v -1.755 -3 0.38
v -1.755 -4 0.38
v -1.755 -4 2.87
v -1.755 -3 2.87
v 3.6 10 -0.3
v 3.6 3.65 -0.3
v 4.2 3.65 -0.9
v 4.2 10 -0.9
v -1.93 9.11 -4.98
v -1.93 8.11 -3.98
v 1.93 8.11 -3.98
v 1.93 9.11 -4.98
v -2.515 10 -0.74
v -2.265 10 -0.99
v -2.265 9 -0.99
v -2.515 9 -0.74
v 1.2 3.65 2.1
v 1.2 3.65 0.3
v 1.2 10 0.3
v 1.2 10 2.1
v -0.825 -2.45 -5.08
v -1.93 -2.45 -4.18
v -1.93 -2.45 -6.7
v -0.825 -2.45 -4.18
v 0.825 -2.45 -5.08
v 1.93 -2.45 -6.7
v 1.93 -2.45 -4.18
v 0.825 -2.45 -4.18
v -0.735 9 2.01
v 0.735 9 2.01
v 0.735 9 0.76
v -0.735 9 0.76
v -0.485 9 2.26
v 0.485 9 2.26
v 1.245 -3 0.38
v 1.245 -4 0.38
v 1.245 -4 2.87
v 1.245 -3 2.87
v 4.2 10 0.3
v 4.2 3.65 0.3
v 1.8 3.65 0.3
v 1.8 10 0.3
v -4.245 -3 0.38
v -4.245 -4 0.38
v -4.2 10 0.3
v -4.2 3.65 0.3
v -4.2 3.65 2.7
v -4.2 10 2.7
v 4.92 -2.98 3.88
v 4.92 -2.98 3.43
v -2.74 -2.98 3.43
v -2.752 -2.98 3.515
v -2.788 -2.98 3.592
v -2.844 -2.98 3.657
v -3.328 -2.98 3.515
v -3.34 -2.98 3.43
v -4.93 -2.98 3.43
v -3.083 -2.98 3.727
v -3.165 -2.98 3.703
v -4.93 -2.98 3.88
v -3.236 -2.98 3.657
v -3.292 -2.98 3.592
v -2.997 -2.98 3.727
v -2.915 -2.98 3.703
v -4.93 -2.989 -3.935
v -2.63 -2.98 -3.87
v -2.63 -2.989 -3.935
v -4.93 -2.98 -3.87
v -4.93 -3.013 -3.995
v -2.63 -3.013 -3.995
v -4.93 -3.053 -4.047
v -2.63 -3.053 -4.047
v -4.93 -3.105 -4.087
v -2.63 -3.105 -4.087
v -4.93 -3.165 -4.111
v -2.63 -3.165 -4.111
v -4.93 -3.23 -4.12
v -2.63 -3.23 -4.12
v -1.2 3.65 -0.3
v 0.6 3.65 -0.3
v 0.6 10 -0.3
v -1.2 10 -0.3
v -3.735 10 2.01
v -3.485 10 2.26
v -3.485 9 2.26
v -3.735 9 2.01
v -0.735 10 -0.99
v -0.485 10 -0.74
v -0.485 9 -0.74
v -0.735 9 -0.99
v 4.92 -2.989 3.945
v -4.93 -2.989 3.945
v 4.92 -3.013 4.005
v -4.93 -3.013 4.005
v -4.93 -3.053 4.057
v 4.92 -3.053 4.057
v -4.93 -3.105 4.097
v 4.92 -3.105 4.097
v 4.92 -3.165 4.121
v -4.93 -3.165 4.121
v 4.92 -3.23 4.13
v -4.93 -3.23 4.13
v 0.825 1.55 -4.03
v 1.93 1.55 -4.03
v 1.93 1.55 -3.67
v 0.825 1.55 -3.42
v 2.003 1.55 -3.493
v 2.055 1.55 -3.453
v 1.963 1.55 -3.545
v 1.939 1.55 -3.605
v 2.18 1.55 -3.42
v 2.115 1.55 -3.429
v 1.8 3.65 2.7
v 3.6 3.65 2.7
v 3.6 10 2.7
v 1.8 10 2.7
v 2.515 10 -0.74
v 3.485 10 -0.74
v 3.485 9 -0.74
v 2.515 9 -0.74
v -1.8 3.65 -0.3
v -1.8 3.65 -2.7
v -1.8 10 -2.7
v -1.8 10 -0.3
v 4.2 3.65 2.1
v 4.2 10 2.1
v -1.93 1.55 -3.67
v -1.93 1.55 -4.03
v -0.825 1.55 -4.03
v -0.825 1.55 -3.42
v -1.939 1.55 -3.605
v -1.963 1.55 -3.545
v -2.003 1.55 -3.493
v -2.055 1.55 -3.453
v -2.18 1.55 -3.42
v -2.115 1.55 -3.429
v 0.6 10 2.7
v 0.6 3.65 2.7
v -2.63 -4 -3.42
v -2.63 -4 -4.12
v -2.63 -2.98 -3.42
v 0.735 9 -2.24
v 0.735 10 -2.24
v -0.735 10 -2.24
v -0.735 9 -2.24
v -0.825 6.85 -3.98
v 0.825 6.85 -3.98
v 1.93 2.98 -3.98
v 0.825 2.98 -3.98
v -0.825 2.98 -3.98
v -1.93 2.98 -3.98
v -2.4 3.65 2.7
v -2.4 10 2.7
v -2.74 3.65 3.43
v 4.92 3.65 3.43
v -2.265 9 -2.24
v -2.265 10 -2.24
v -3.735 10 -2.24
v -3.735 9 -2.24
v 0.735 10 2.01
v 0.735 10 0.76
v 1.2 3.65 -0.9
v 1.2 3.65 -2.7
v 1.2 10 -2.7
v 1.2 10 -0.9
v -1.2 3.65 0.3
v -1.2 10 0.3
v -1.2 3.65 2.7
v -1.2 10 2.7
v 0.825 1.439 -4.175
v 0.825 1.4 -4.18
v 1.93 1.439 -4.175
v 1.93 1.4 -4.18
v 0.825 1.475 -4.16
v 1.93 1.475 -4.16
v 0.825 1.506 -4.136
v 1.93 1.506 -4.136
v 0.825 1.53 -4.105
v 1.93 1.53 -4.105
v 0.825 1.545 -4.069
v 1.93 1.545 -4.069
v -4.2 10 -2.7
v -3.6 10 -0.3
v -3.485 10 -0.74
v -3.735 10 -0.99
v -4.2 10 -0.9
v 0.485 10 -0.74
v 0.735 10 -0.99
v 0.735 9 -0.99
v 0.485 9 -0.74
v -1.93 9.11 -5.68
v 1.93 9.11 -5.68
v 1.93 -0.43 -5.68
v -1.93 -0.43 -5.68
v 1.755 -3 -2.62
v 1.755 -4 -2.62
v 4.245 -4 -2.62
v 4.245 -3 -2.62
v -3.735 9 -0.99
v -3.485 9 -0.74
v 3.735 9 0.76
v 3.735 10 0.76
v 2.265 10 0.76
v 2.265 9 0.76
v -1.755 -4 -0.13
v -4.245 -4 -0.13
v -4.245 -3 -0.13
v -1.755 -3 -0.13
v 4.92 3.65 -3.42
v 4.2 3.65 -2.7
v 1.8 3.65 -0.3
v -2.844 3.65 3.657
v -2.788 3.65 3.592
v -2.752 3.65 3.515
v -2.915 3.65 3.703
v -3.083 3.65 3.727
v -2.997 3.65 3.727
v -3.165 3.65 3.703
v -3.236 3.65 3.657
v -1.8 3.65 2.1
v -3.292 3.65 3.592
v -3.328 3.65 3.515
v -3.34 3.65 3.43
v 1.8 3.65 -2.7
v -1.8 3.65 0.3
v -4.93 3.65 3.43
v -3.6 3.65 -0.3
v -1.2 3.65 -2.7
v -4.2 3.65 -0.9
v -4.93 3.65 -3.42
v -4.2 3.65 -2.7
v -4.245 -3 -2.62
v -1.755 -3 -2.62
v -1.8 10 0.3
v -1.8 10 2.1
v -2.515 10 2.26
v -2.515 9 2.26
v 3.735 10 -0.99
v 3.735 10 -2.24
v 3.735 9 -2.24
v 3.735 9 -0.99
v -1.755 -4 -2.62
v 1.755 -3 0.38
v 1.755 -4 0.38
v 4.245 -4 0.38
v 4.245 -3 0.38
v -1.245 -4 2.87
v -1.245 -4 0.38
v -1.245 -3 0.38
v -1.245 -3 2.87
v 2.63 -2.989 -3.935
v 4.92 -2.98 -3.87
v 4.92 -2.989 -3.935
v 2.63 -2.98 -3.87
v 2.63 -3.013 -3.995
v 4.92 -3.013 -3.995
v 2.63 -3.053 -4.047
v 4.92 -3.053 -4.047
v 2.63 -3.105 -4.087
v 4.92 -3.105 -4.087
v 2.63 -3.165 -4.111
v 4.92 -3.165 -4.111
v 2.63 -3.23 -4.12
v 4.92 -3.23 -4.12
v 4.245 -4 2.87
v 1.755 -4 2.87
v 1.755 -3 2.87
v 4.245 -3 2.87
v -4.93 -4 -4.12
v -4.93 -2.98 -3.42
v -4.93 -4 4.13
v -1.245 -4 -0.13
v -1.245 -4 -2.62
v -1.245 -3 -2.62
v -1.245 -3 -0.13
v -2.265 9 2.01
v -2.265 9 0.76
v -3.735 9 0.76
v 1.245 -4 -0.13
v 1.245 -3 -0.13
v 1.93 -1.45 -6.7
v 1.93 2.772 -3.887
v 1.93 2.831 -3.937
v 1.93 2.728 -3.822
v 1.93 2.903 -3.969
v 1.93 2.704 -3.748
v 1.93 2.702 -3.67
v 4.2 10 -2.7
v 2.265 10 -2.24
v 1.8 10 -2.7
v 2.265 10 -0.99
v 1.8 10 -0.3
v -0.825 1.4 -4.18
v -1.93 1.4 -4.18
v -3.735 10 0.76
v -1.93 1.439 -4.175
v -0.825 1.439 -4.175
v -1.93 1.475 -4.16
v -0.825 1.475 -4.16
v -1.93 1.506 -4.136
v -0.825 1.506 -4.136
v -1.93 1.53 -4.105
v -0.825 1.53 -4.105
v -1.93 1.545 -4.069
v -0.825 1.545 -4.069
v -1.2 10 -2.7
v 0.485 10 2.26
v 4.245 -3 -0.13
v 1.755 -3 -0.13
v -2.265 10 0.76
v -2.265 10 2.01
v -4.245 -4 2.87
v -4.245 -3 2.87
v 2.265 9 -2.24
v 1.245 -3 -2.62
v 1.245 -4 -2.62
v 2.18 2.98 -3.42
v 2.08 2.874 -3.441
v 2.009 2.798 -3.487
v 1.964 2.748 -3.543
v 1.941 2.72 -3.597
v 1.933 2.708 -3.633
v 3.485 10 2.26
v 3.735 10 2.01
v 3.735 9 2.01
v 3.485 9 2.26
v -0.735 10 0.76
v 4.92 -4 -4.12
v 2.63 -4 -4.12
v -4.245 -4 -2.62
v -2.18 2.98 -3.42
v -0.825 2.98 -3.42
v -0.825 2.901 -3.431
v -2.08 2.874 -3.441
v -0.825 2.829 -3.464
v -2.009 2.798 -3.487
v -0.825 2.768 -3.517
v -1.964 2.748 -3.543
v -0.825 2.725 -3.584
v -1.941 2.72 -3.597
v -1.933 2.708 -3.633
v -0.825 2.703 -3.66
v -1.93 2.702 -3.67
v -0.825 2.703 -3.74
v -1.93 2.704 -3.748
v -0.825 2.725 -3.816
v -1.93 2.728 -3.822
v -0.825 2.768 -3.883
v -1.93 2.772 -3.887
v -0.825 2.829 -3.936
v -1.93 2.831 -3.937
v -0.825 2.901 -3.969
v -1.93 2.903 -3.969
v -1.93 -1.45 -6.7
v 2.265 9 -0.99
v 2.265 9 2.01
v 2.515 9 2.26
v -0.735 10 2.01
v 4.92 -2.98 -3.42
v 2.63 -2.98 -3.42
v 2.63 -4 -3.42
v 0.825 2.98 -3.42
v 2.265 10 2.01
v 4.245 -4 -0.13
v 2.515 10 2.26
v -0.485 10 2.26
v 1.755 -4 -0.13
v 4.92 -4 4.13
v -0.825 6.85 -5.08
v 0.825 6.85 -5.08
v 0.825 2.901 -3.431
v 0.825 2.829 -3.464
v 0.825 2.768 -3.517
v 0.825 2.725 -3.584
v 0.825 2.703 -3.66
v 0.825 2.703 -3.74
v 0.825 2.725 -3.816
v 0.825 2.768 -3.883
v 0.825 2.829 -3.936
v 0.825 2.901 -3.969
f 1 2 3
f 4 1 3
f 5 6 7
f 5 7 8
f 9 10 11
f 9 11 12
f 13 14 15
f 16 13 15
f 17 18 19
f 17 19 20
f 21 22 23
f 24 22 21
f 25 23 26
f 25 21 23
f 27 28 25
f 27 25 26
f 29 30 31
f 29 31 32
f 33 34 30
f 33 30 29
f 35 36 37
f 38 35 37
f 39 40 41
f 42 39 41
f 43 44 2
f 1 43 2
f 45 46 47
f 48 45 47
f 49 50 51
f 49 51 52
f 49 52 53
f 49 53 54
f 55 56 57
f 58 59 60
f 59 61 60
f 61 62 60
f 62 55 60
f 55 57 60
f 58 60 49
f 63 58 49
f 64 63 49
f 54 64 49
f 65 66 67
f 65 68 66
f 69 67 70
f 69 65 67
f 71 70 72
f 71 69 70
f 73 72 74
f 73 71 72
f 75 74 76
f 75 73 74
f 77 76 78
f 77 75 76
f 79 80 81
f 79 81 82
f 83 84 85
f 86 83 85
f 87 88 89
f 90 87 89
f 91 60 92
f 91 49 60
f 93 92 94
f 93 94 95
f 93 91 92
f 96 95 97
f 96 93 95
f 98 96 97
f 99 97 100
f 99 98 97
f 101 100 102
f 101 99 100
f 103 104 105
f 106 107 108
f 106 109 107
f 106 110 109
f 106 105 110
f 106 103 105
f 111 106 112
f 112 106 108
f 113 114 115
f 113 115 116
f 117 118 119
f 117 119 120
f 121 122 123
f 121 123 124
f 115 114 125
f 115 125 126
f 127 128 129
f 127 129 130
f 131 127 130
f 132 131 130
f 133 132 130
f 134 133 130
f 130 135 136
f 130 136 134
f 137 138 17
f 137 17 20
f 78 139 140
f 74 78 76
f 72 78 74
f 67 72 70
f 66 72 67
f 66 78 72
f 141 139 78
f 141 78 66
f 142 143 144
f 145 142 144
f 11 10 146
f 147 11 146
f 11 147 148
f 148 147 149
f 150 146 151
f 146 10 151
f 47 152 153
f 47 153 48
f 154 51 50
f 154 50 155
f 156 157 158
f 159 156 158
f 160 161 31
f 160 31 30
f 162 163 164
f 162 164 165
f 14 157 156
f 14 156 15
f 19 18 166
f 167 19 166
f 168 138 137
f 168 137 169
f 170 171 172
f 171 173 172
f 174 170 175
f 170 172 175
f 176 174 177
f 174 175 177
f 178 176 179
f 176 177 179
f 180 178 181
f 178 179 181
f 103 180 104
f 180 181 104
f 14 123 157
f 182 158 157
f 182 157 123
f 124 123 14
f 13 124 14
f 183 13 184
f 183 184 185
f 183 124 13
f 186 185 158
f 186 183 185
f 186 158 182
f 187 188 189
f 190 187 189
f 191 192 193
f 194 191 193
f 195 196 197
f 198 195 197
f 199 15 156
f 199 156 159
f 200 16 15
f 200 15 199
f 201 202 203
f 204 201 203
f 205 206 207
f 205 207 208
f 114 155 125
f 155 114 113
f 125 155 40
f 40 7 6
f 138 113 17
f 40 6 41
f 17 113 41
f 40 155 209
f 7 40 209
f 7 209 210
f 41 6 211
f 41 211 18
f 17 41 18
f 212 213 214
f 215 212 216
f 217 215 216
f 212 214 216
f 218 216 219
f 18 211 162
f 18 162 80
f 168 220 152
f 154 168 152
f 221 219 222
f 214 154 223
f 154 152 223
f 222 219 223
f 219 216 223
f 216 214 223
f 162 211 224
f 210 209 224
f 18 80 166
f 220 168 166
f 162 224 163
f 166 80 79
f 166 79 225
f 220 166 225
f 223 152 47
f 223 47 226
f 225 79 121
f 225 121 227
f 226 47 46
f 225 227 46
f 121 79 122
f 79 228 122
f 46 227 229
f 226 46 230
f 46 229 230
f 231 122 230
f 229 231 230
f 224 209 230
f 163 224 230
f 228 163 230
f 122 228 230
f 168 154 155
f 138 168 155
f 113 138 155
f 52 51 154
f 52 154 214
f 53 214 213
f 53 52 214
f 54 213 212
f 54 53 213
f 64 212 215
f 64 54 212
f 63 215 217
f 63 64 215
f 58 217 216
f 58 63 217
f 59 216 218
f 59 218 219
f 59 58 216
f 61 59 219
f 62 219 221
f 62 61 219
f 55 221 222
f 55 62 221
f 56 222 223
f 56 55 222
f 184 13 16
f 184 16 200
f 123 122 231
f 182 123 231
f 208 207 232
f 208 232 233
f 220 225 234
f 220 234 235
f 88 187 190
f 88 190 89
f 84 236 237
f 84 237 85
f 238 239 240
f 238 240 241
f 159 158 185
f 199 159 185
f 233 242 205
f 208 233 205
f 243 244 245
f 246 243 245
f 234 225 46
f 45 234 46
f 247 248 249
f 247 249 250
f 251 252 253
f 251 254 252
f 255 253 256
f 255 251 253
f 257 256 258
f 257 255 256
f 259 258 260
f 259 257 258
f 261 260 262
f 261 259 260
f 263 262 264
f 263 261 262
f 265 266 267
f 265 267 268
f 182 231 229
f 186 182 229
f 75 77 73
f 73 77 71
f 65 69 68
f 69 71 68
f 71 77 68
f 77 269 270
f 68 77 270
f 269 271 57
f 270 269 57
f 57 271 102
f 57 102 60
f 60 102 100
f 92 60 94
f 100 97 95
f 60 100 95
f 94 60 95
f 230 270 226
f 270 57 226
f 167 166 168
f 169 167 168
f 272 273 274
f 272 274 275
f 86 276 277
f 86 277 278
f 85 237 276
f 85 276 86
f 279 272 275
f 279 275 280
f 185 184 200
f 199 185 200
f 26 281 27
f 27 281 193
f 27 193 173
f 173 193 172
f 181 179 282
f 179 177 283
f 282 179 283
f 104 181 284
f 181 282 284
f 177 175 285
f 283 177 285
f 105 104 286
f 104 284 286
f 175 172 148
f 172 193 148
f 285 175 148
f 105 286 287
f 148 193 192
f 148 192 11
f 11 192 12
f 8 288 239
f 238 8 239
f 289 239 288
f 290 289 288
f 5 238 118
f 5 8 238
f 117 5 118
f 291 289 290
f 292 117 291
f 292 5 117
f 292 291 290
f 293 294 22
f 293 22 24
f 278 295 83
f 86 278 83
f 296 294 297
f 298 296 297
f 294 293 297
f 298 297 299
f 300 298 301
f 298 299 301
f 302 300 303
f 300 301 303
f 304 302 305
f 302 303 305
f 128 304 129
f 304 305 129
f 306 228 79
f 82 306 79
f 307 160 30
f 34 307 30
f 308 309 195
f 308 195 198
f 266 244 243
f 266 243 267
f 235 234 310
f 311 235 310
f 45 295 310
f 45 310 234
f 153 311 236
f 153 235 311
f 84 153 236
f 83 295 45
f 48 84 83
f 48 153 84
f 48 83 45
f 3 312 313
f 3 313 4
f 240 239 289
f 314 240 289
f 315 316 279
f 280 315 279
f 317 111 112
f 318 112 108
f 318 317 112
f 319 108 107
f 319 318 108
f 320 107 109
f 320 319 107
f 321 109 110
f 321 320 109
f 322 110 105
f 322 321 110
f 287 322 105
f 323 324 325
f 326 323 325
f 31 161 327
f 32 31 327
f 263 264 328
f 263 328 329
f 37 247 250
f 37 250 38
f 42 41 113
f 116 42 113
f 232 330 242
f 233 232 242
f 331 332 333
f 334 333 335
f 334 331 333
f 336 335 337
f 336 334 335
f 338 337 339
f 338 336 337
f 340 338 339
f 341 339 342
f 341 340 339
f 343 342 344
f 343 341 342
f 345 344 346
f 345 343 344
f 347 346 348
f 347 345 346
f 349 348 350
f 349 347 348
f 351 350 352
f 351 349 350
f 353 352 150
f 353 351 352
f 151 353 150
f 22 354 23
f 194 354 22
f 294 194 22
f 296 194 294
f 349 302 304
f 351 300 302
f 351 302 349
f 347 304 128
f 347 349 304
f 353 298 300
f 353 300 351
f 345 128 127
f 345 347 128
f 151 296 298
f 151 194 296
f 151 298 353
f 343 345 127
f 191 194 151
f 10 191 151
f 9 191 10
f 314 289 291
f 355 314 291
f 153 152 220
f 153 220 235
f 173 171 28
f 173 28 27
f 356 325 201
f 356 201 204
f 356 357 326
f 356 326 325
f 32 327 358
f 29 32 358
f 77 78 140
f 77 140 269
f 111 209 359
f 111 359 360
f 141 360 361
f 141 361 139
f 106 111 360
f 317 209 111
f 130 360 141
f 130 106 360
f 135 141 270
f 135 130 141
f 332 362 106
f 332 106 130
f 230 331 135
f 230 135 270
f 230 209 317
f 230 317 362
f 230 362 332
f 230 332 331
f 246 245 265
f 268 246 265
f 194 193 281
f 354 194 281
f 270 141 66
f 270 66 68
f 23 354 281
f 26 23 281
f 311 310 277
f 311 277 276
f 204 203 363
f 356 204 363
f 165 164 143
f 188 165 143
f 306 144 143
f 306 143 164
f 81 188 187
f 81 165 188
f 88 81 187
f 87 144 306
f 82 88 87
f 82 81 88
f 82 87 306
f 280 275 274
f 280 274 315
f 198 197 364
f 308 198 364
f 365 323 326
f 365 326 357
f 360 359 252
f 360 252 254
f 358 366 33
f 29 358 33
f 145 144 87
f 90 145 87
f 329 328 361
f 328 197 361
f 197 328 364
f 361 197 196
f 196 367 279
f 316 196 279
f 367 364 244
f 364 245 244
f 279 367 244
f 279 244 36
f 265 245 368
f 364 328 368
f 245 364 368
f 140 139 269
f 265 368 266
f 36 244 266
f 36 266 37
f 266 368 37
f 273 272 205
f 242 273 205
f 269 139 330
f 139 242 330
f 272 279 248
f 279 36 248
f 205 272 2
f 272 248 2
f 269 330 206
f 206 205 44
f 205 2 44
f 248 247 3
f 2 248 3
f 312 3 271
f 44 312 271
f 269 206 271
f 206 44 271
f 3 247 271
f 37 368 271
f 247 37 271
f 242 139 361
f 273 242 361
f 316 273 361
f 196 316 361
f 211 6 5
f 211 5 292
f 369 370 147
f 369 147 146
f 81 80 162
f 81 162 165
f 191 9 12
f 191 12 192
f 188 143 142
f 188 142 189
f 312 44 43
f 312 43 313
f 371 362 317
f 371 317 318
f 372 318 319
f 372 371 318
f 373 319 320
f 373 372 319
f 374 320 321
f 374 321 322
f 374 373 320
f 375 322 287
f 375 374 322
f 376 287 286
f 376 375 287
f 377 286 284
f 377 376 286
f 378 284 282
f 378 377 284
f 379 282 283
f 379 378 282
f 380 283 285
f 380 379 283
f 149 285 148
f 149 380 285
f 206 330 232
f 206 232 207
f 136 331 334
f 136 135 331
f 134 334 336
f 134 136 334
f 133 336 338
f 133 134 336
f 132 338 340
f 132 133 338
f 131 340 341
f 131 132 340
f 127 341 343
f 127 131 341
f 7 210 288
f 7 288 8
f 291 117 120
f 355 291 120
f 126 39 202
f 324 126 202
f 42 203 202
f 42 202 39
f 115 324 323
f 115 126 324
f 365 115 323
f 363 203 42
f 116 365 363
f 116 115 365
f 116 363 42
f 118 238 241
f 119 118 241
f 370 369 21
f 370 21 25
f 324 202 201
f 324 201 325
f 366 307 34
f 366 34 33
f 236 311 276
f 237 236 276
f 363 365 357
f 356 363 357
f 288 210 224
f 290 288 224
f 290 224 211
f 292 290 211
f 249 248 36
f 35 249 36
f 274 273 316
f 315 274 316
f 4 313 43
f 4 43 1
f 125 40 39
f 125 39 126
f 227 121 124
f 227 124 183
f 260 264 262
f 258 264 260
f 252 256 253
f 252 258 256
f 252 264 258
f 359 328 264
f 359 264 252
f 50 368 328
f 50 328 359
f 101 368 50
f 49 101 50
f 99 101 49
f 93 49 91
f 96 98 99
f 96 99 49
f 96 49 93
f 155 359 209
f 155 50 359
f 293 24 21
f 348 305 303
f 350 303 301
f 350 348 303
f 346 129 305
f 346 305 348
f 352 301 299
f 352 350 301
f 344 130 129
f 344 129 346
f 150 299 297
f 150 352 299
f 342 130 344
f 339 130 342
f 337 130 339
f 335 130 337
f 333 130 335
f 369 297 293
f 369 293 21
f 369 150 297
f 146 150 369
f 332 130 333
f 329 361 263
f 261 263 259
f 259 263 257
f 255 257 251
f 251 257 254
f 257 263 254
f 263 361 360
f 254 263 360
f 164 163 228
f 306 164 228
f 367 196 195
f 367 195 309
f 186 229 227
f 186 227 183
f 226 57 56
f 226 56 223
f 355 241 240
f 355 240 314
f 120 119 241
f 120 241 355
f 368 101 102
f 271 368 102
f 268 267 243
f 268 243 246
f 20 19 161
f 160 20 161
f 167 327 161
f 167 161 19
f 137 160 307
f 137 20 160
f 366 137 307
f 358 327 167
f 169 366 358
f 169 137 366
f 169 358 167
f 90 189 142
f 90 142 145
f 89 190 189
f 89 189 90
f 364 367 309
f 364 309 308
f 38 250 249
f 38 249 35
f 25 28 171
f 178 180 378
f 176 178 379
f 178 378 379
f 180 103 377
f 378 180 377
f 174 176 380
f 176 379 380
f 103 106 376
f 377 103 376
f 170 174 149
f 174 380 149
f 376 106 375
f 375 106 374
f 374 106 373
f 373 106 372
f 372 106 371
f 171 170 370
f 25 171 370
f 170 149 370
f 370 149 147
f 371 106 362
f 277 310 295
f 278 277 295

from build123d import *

# Parameters (mm, degrees)
BOSS_EXTRUDE1_START  = -0.825
BOSS_EXTRUDE1_DEPTH  = 1.65
BOSS_EXTRUDE2_START  = 1.105
BOSS_EXTRUDE2_DEPTH  = 1.105
BOSS_EXTRUDE3_DEPTH  = 1.105
CUT_EXTRUDE1_DEPTH   = 1.65
SKETCH5_W            = 9.85
SKETCH5_H            = 7.65
BOSS_EXTRUDE4_DEPTH  = 7.55
CUT_EXTRUDE2_REACH   = 15.28
SKETCH6_W            = 1.65
SKETCH6_H            = 5.3
SKETCH7_W            = 3.86
SKETCH7_H            = 2.52
BOSS_EXTRUDE5_DEPTH  = 4
SKETCH8_W            = 1.65
SKETCH8_H            = 9.3
CUT_EXTRUDE3_DEPTH   = 0.9
SKETCH9_W            = 0.7
SKETCH9_H            = 6.63
CUT_EXTRUDE4_DEPTH   = 15.996819663
BOSS_EXTRUDE6_DEPTH  = 6.63
CUT_EXTRUDE5_DEPTH   = 14.226552839
SKETCH12_W           = 2.4
SKETCH12_H           = 2.4
BOSS_EXTRUDE7_DEPTH  = 6.35
SKETCH13_W           = 1.47
SKETCH13_H           = 1.5
CUT_EXTRUDE6_DEPTH   = 1
SKETCH14_W           = 2.4
SKETCH14_H           = 2.4
BOSS_EXTRUDE8_DEPTH  = 6.35
SKETCH15_W           = 1.47
SKETCH15_H           = 1.5
CUT_EXTRUDE7_DEPTH   = 1
SKETCH16_W           = 2.4
SKETCH16_H           = 2.4
BOSS_EXTRUDE9_DEPTH  = 6.35
SKETCH17_W           = 1.47
SKETCH17_H           = 1.5
CUT_EXTRUDE8_DEPTH   = 1
SKETCH18_W           = 2.4
SKETCH18_H           = 2.4
BOSS_EXTRUDE10_DEPTH = 6.35
SKETCH19_W           = 1.47
SKETCH19_H           = 1.5
CUT_EXTRUDE9_DEPTH   = 1
SKETCH20_W           = 2.4
SKETCH20_H           = 2.4
BOSS_EXTRUDE11_DEPTH = 6.35
SKETCH21_W           = 1.47
SKETCH21_H           = 1.5
CUT_EXTRUDE10_DEPTH  = 1
SKETCH22_W           = 2.4
SKETCH22_H           = 2.4
BOSS_EXTRUDE12_DEPTH = 6.35
SKETCH23_W           = 1.47
SKETCH23_H           = 1.5
CUT_EXTRUDE11_DEPTH  = 1
SKETCH24_W           = 2.49
SKETCH24_H           = 2.49
CUT_EXTRUDE12_DEPTH  = 1
SKETCH25_W           = 2.49
SKETCH25_H           = 2.49
CUT_EXTRUDE13_DEPTH  = 1
SKETCH26_W           = 2.49
SKETCH26_H           = 2.49
CUT_EXTRUDE14_DEPTH  = 1
SKETCH27_W           = 2.49
SKETCH27_H           = 2.49
CUT_EXTRUDE15_DEPTH  = 1
SKETCH28_W           = 2.49
SKETCH28_H           = 2.49
CUT_EXTRUDE16_DEPTH  = 1
SKETCH29_W           = 2.29
SKETCH29_H           = 1.02
BOSS_EXTRUDE13_DEPTH = 0.7
SKETCH30_W           = 2.3
SKETCH30_H           = 1.02
BOSS_EXTRUDE14_DEPTH = 0.7
SKETCH31_W           = 2.49
SKETCH31_H           = 2.49
CUT_EXTRUDE17_DEPTH  = 1
CHAMFER1_SIZE        = 0.6
CHAMFER2_SIZE        = 0.25
FILLET1_R            = 0.25
FILLET2_R            = 0.15


with BuildPart() as part:
    # Boss-Extrude1: read off the stored shape, not the designer's step
    # Boss-Extrude1 outline → Boss-Extrude1 (new body)
    with BuildSketch(Plane.YZ.offset(BOSS_EXTRUDE1_START)):
        with BuildLine():
            Line((2.98, -3.42), (1.55, -3.42))
            Line((1.55, -3.42), (1.55, -6.7))
            Line((1.55, -6.7), (9.11, -6.7))
            Line((9.11, -6.7), (9.11, -4.98))
            Line((9.11, -4.98), (8.11, -3.98))
            Line((8.11, -3.98), (2.98, -3.98))
            ThreePointArc((2.98, -3.98), (2.7, -3.7), (2.98, -3.42))
        make_face()
    extrude(amount=BOSS_EXTRUDE1_DEPTH)

    # Sketch2 → Boss-Extrude2 (add)
    with BuildSketch(Plane.ZY.offset(0.825).offset(BOSS_EXTRUDE2_START)):
        with BuildLine():
            Line((-6.7, 1.55), (-6.7, 9.11))
            Line((-6.7, 9.11), (-4.98, 9.11))
            Line((-4.98, 9.11), (-3.98, 8.11))
            Line((-3.98, 8.11), (-3.98, 2.98))
            ThreePointArc((-3.98, 2.98), (-3.7, 2.7), (-3.42, 2.98))
            Line((-3.42, 2.98), (-3.42, 1.55))
            Line((-3.42, 1.55), (-6.7, 1.55))
        make_face()
    extrude(amount=-BOSS_EXTRUDE2_DEPTH)

    # Sketch3 → Boss-Extrude3 (add)
    with BuildSketch(Plane(origin=(0.825, 0, 0), x_dir=(0, 0, -1), z_dir=(1, 0, 0))):
        with BuildLine():
            Line((6.7, 1.55), (3.42, 1.55))
            Line((3.42, 1.55), (3.42, 2.98))
            ThreePointArc((3.42, 2.98), (3.7, 2.7), (3.98, 2.98))
            Line((3.98, 2.98), (3.98, 8.11))
            Line((3.98, 8.11), (4.98, 9.11))
            Line((4.98, 9.11), (6.7, 9.11))
            Line((6.7, 9.11), (6.7, 1.55))
        make_face()
    extrude(amount=BOSS_EXTRUDE3_DEPTH)

    # Sketch4 → Cut-Extrude1 (cut)
    with BuildSketch(Plane(origin=(-0.825, 0, 0), x_dir=(0, -1, 0), z_dir=(-1, 0, 0))):
        with BuildLine():
            Line((-2.98, -3.98), (-1.55, -3.98))
            Line((-1.55, -3.98), (-1.55, -3.42))
            Line((-1.55, -3.42), (-2.98, -3.42))
            ThreePointArc((-2.98, -3.42), (-2.7, -3.7), (-2.98, -3.98))
        make_face()
    extrude(amount=-CUT_EXTRUDE1_DEPTH, mode=Mode.SUBTRACT)

    # Sketch5 → Boss-Extrude4 (add)
    with BuildSketch(Plane(origin=(0, 0, -3.42), x_dir=(-1, 0, 0), z_dir=(0, 0, -1))):
        with Locations((0.005, -0.175)):
            Rectangle(SKETCH5_W, SKETCH5_H)
    extrude(amount=-BOSS_EXTRUDE4_DEPTH)

    # Sketch6 → Cut-Extrude2 (cut, up to next)
    with BuildSketch(Plane(origin=(0, 0, -4.18), x_dir=(-1, 0, 0), z_dir=(0, 0, -1)), mode=Mode.PRIVATE) as cut_extrude2_sk1:
        with Locations((0, 4.2)):
            Rectangle(SKETCH6_W, SKETCH6_H)
    cut_extrude2_tool1 = extrude(cut_extrude2_sk1.sketch, amount=-CUT_EXTRUDE2_REACH, mode=Mode.PRIVATE) & part.part
    add(cut_extrude2_tool1.solids().sort_by_distance((0, 4.2, -4.18))[0], mode=Mode.SUBTRACT)

    # Sketch7 → Boss-Extrude5 (add)
    with BuildSketch(Plane.XZ.offset(-1.55)):
        with Locations((0, -5.44)):
            Rectangle(SKETCH7_W, SKETCH7_H)
    extrude(amount=BOSS_EXTRUDE5_DEPTH)

    # Sketch8 → Cut-Extrude3 (cut)
    with BuildSketch(Plane.XY.offset(-4.18)):
        with Locations((0, 2.2)):
            Rectangle(SKETCH8_W, SKETCH8_H)
    extrude(amount=-CUT_EXTRUDE3_DEPTH, mode=Mode.SUBTRACT)

    # Sketch9 → Cut-Extrude4 (cut, through all)
    with BuildSketch(Plane.ZY.offset(4.93)):
        with Locations((3.78, 0.335)):
            Rectangle(SKETCH9_W, SKETCH9_H)
    extrude(amount=-CUT_EXTRUDE4_DEPTH, mode=Mode.SUBTRACT)

    # Sketch10 → Boss-Extrude6 (add)
    with BuildSketch(Plane(origin=(0, -2.98, 0), x_dir=(-1, 0, 0), z_dir=(0, 1, 0))):
        with BuildLine():
            Line((3.34, 3.43), (2.74, 3.43))
            ThreePointArc((2.74, 3.43), (3.04, 3.73), (3.34, 3.43))
        make_face()
    extrude(amount=BOSS_EXTRUDE6_DEPTH)

    # Sketch11 → Cut-Extrude5 (cut, through all)
    with BuildSketch(Plane(origin=(1.93, 0, 0), x_dir=(0, 0, -1), z_dir=(1, 0, 0))):
        Polygon((5.68, -0.43), (6.7, -1.45), (6.7, 9.11), (5.68, 9.11), align=None)
    extrude(amount=-CUT_EXTRUDE5_DEPTH, mode=Mode.SUBTRACT)

    # Sketch12 → Boss-Extrude7 (add)
    with BuildSketch(Plane(origin=(0, 3.65, 0), x_dir=(-1, 0, 0), z_dir=(0, 1, 0))):
        with Locations((3, 1.5)):
            Rectangle(SKETCH12_W, SKETCH12_H)
    extrude(amount=BOSS_EXTRUDE7_DEPTH)

    # Sketch13 → Cut-Extrude6 (cut)
    with BuildSketch(Plane(origin=(0, 10, 0), x_dir=(-1, 0, 0), z_dir=(0, 1, 0))):
        with Locations((3, 1.51)):
            Rectangle(SKETCH13_W, SKETCH13_H)
    extrude(amount=-CUT_EXTRUDE6_DEPTH, mode=Mode.SUBTRACT)

    # Sketch14 → Boss-Extrude8 (add)
    with BuildSketch(Plane(origin=(0, 3.65, 0), x_dir=(-1, 0, 0), z_dir=(0, 1, 0))):
        with Locations((0, 1.5)):
            Rectangle(SKETCH14_W, SKETCH14_H)
    extrude(amount=BOSS_EXTRUDE8_DEPTH)

    # Sketch15 → Cut-Extrude7 (cut)
    with BuildSketch(Plane(origin=(0, 10, 0), x_dir=(-1, 0, 0), z_dir=(0, 1, 0))):
        with Locations((0, 1.51)):
            Rectangle(SKETCH15_W, SKETCH15_H)
    extrude(amount=-CUT_EXTRUDE7_DEPTH, mode=Mode.SUBTRACT)

    # Sketch16 → Boss-Extrude9 (add)
    with BuildSketch(Plane(origin=(0, 3.65, 0), x_dir=(-1, 0, 0), z_dir=(0, 1, 0))):
        with Locations((0, -1.5)):
            Rectangle(SKETCH16_W, SKETCH16_H)
    extrude(amount=BOSS_EXTRUDE9_DEPTH)

    # Sketch17 → Cut-Extrude8 (cut)
    with BuildSketch(Plane(origin=(0, 10, 0), x_dir=(-1, 0, 0), z_dir=(0, 1, 0))):
        with Locations((0, -1.49)):
            Rectangle(SKETCH17_W, SKETCH17_H)
    extrude(amount=-CUT_EXTRUDE8_DEPTH, mode=Mode.SUBTRACT)

    # Sketch18 → Boss-Extrude10 (add)
    with BuildSketch(Plane(origin=(0, 3.65, 0), x_dir=(-1, 0, 0), z_dir=(0, 1, 0))):
        with Locations((-3, 1.5)):
            Rectangle(SKETCH18_W, SKETCH18_H)
    extrude(amount=BOSS_EXTRUDE10_DEPTH)

    # Sketch19 → Cut-Extrude9 (cut)
    with BuildSketch(Plane(origin=(0, 10, 0), x_dir=(-1, 0, 0), z_dir=(0, 1, 0))):
        with Locations((-3, 1.51)):
            Rectangle(SKETCH19_W, SKETCH19_H)
    extrude(amount=-CUT_EXTRUDE9_DEPTH, mode=Mode.SUBTRACT)

    # Sketch20 → Boss-Extrude11 (add)
    with BuildSketch(Plane(origin=(0, 3.65, 0), x_dir=(-1, 0, 0), z_dir=(0, 1, 0))):
        with Locations((-3, -1.5)):
            Rectangle(SKETCH20_W, SKETCH20_H)
    extrude(amount=BOSS_EXTRUDE11_DEPTH)

    # Sketch21 → Cut-Extrude10 (cut)
    with BuildSketch(Plane(origin=(0, 10, 0), x_dir=(-1, 0, 0), z_dir=(0, 1, 0))):
        with Locations((-3, -1.49)):
            Rectangle(SKETCH21_W, SKETCH21_H)
    extrude(amount=-CUT_EXTRUDE10_DEPTH, mode=Mode.SUBTRACT)

    # Sketch22 → Boss-Extrude12 (add)
    with BuildSketch(Plane(origin=(0, 3.65, 0), x_dir=(-1, 0, 0), z_dir=(0, 1, 0))):
        with Locations((3, -1.5)):
            Rectangle(SKETCH22_W, SKETCH22_H)
    extrude(amount=BOSS_EXTRUDE12_DEPTH)

    # Sketch23 → Cut-Extrude11 (cut)
    with BuildSketch(Plane(origin=(0, 10, 0), x_dir=(-1, 0, 0), z_dir=(0, 1, 0))):
        with Locations((3, -1.49)):
            Rectangle(SKETCH23_W, SKETCH23_H)
    extrude(amount=-CUT_EXTRUDE11_DEPTH, mode=Mode.SUBTRACT)

    # Sketch24 → Cut-Extrude12 (cut)
    with BuildSketch(Plane.XZ.offset(4)):
        with Locations((-3, -1.375)):
            Rectangle(SKETCH24_W, SKETCH24_H)
    extrude(amount=-CUT_EXTRUDE12_DEPTH, mode=Mode.SUBTRACT)

    # Sketch25 → Cut-Extrude13 (cut)
    with BuildSketch(Plane.XZ.offset(4)):
        with Locations((-3, 1.625)):
            Rectangle(SKETCH25_W, SKETCH25_H)
    extrude(amount=-CUT_EXTRUDE13_DEPTH, mode=Mode.SUBTRACT)

    # Sketch26 → Cut-Extrude14 (cut)
    with BuildSketch(Plane.XZ.offset(4)):
        with Locations((0, -1.375)):
            Rectangle(SKETCH26_W, SKETCH26_H)
    extrude(amount=-CUT_EXTRUDE14_DEPTH, mode=Mode.SUBTRACT)

    # Sketch27 → Cut-Extrude15 (cut)
    with BuildSketch(Plane.XZ.offset(4)):
        with Locations((0, 1.625)):
            Rectangle(SKETCH27_W, SKETCH27_H)
    extrude(amount=-CUT_EXTRUDE15_DEPTH, mode=Mode.SUBTRACT)

    # Sketch28 → Cut-Extrude16 (cut)
    with BuildSketch(Plane.XZ.offset(4)):
        with Locations((3, -1.375)):
            Rectangle(SKETCH28_W, SKETCH28_H)
    extrude(amount=-CUT_EXTRUDE16_DEPTH, mode=Mode.SUBTRACT)

    # Sketch29 → Boss-Extrude13 (add)
    with BuildSketch(Plane(origin=(0, 0, -3.42), x_dir=(-1, 0, 0), z_dir=(0, 0, -1))):
        with Locations((-3.775, -3.49)):
            Rectangle(SKETCH29_W, SKETCH29_H)
    extrude(amount=BOSS_EXTRUDE13_DEPTH)

    # Sketch30 → Boss-Extrude14 (add)
    with BuildSketch(Plane(origin=(0, 0, -3.42), x_dir=(-1, 0, 0), z_dir=(0, 0, -1))):
        with Locations((3.78, -3.49)):
            Rectangle(SKETCH30_W, SKETCH30_H)
    extrude(amount=BOSS_EXTRUDE14_DEPTH)

    # Sketch31 → Cut-Extrude17 (cut)
    with BuildSketch(Plane.XZ.offset(4)):
        with Locations((3, 1.625)):
            Rectangle(SKETCH31_W, SKETCH31_H)
    extrude(amount=-CUT_EXTRUDE17_DEPTH, mode=Mode.SUBTRACT)

    # Chamfer1
    chamfer1_edges = [part.edges().sort_by_distance(p)[0] for p in [
        (-1.8, 6.825, 2.7),
        (1.2, 6.825, 2.7),
        (1.2, 6.825, -0.3),
        (4.2, 6.825, 2.7),
        (4.2, 6.825, -0.3),
        (-4.2, 6.825, -0.3),
    ]]
    chamfer(chamfer1_edges, length=CHAMFER1_SIZE)

    # Chamfer2
    chamfer2_edges = [part.edges().sort_by_distance(p)[0] for p in [
        (-2.265, 9.5, 2.26),
        (-3.735, 9.5, 2.26),
        (0.735, 9.5, 2.26),
        (-0.735, 9.5, 2.26),
        (0.735, 9.5, -0.74),
        (-0.735, 9.5, -0.74),
        (3.735, 9.5, 2.26),
        (2.265, 9.5, 2.26),
        (3.735, 9.5, -0.74),
        (2.265, 9.5, -0.74),
        (-2.265, 9.5, -0.74),
        (-3.735, 9.5, -0.74),
    ]]
    chamfer(chamfer2_edges, length=CHAMFER2_SIZE)

    # Fillet1
    fillet1_edges = [part.edges().sort_by_distance(p)[0] for p in [
        (-1.93, 2.265, -3.42),
        (1.93, 2.265, -3.42),
        (-0.005, -2.98, 4.13),
        (3.775, -2.98, -4.12),
        (-3.78, -2.98, -4.12),
    ]]
    fillet(fillet1_edges, radius=FILLET1_R - 0.0001)  # a hair under: the kernel refuses the full size

    # Fillet2
    fillet2_edges = [part.edges().sort_by_distance(p)[0] for p in [
        (1.3775, 1.55, -4.18),
        (-1.3775, 1.55, -4.18),
    ]]
    fillet(fillet2_edges, radius=FILLET2_R)


solid = part.part
